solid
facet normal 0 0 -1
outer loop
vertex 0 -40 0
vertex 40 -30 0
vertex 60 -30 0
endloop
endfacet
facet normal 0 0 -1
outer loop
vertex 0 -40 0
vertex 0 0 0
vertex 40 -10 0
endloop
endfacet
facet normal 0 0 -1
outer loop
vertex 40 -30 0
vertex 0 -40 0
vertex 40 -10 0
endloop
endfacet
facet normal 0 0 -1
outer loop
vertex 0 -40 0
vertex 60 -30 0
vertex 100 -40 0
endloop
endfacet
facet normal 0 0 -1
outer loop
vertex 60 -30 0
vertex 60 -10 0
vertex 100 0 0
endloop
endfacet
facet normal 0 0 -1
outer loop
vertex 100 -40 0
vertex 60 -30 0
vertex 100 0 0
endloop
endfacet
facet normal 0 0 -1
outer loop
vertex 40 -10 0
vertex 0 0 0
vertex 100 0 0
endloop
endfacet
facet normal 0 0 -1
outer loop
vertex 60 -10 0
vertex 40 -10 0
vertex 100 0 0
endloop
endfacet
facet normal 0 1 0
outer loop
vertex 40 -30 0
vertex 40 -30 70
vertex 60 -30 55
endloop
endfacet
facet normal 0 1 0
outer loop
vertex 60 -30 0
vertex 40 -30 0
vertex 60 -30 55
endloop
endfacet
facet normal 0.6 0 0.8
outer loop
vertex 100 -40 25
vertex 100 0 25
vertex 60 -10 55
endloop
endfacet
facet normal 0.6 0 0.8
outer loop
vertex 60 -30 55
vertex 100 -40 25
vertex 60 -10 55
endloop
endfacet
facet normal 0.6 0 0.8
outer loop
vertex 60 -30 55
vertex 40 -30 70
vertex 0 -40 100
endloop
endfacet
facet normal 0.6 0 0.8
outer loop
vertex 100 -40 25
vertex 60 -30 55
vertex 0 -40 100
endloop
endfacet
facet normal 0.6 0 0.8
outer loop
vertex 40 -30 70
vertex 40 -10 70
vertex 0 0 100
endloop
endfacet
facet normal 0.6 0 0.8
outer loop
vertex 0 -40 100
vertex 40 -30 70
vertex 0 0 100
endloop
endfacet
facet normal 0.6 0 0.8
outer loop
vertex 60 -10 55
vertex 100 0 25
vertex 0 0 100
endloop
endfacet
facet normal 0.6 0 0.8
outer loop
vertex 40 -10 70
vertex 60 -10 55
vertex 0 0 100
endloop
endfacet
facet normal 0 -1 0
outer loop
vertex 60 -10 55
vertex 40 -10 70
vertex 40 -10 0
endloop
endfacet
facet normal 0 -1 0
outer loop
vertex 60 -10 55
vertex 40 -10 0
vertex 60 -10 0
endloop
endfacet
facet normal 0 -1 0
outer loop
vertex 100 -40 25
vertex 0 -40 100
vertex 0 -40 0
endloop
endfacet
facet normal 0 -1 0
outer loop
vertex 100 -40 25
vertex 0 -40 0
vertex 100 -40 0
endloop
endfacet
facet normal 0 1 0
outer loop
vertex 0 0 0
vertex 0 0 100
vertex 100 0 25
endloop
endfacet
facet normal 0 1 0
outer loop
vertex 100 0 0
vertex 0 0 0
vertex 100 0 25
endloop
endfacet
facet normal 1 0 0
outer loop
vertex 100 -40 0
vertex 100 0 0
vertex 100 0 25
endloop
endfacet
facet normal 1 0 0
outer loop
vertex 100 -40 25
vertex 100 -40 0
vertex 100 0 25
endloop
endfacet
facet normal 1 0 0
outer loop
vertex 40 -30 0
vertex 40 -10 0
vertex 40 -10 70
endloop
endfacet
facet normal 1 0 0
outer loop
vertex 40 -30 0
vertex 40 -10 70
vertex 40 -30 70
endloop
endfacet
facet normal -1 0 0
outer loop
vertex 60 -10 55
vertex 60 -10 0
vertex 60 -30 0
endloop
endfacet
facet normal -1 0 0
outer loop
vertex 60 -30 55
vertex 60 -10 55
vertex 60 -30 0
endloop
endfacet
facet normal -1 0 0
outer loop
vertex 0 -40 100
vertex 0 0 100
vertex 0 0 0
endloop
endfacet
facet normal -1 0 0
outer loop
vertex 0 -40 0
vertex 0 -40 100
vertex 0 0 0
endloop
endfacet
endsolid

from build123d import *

# Parameters (mm, degrees)
F1_DEPTH = 40
F2_W     = 20
F2_H     = 20
F3_DEPTH = 100.001


with BuildPart() as f1:
    # F0 (on Front) → F1 (new body)
    with BuildSketch(Plane.XZ):
        Polygon((0, 100), (0, 0), (100, 0), (100, 25), align=None)
    extrude(amount=F1_DEPTH)

    # F2 (on face) → F3 (cut, through all)
    with BuildSketch(Plane(origin=(0, 0, 0), x_dir=(1, 0, 0), z_dir=(0, 0, -1))):
        with Locations((50, 20)):
            Rectangle(F2_W, F2_H)
    extrude(amount=-F3_DEPTH, mode=Mode.SUBTRACT)


solid = f1.part
